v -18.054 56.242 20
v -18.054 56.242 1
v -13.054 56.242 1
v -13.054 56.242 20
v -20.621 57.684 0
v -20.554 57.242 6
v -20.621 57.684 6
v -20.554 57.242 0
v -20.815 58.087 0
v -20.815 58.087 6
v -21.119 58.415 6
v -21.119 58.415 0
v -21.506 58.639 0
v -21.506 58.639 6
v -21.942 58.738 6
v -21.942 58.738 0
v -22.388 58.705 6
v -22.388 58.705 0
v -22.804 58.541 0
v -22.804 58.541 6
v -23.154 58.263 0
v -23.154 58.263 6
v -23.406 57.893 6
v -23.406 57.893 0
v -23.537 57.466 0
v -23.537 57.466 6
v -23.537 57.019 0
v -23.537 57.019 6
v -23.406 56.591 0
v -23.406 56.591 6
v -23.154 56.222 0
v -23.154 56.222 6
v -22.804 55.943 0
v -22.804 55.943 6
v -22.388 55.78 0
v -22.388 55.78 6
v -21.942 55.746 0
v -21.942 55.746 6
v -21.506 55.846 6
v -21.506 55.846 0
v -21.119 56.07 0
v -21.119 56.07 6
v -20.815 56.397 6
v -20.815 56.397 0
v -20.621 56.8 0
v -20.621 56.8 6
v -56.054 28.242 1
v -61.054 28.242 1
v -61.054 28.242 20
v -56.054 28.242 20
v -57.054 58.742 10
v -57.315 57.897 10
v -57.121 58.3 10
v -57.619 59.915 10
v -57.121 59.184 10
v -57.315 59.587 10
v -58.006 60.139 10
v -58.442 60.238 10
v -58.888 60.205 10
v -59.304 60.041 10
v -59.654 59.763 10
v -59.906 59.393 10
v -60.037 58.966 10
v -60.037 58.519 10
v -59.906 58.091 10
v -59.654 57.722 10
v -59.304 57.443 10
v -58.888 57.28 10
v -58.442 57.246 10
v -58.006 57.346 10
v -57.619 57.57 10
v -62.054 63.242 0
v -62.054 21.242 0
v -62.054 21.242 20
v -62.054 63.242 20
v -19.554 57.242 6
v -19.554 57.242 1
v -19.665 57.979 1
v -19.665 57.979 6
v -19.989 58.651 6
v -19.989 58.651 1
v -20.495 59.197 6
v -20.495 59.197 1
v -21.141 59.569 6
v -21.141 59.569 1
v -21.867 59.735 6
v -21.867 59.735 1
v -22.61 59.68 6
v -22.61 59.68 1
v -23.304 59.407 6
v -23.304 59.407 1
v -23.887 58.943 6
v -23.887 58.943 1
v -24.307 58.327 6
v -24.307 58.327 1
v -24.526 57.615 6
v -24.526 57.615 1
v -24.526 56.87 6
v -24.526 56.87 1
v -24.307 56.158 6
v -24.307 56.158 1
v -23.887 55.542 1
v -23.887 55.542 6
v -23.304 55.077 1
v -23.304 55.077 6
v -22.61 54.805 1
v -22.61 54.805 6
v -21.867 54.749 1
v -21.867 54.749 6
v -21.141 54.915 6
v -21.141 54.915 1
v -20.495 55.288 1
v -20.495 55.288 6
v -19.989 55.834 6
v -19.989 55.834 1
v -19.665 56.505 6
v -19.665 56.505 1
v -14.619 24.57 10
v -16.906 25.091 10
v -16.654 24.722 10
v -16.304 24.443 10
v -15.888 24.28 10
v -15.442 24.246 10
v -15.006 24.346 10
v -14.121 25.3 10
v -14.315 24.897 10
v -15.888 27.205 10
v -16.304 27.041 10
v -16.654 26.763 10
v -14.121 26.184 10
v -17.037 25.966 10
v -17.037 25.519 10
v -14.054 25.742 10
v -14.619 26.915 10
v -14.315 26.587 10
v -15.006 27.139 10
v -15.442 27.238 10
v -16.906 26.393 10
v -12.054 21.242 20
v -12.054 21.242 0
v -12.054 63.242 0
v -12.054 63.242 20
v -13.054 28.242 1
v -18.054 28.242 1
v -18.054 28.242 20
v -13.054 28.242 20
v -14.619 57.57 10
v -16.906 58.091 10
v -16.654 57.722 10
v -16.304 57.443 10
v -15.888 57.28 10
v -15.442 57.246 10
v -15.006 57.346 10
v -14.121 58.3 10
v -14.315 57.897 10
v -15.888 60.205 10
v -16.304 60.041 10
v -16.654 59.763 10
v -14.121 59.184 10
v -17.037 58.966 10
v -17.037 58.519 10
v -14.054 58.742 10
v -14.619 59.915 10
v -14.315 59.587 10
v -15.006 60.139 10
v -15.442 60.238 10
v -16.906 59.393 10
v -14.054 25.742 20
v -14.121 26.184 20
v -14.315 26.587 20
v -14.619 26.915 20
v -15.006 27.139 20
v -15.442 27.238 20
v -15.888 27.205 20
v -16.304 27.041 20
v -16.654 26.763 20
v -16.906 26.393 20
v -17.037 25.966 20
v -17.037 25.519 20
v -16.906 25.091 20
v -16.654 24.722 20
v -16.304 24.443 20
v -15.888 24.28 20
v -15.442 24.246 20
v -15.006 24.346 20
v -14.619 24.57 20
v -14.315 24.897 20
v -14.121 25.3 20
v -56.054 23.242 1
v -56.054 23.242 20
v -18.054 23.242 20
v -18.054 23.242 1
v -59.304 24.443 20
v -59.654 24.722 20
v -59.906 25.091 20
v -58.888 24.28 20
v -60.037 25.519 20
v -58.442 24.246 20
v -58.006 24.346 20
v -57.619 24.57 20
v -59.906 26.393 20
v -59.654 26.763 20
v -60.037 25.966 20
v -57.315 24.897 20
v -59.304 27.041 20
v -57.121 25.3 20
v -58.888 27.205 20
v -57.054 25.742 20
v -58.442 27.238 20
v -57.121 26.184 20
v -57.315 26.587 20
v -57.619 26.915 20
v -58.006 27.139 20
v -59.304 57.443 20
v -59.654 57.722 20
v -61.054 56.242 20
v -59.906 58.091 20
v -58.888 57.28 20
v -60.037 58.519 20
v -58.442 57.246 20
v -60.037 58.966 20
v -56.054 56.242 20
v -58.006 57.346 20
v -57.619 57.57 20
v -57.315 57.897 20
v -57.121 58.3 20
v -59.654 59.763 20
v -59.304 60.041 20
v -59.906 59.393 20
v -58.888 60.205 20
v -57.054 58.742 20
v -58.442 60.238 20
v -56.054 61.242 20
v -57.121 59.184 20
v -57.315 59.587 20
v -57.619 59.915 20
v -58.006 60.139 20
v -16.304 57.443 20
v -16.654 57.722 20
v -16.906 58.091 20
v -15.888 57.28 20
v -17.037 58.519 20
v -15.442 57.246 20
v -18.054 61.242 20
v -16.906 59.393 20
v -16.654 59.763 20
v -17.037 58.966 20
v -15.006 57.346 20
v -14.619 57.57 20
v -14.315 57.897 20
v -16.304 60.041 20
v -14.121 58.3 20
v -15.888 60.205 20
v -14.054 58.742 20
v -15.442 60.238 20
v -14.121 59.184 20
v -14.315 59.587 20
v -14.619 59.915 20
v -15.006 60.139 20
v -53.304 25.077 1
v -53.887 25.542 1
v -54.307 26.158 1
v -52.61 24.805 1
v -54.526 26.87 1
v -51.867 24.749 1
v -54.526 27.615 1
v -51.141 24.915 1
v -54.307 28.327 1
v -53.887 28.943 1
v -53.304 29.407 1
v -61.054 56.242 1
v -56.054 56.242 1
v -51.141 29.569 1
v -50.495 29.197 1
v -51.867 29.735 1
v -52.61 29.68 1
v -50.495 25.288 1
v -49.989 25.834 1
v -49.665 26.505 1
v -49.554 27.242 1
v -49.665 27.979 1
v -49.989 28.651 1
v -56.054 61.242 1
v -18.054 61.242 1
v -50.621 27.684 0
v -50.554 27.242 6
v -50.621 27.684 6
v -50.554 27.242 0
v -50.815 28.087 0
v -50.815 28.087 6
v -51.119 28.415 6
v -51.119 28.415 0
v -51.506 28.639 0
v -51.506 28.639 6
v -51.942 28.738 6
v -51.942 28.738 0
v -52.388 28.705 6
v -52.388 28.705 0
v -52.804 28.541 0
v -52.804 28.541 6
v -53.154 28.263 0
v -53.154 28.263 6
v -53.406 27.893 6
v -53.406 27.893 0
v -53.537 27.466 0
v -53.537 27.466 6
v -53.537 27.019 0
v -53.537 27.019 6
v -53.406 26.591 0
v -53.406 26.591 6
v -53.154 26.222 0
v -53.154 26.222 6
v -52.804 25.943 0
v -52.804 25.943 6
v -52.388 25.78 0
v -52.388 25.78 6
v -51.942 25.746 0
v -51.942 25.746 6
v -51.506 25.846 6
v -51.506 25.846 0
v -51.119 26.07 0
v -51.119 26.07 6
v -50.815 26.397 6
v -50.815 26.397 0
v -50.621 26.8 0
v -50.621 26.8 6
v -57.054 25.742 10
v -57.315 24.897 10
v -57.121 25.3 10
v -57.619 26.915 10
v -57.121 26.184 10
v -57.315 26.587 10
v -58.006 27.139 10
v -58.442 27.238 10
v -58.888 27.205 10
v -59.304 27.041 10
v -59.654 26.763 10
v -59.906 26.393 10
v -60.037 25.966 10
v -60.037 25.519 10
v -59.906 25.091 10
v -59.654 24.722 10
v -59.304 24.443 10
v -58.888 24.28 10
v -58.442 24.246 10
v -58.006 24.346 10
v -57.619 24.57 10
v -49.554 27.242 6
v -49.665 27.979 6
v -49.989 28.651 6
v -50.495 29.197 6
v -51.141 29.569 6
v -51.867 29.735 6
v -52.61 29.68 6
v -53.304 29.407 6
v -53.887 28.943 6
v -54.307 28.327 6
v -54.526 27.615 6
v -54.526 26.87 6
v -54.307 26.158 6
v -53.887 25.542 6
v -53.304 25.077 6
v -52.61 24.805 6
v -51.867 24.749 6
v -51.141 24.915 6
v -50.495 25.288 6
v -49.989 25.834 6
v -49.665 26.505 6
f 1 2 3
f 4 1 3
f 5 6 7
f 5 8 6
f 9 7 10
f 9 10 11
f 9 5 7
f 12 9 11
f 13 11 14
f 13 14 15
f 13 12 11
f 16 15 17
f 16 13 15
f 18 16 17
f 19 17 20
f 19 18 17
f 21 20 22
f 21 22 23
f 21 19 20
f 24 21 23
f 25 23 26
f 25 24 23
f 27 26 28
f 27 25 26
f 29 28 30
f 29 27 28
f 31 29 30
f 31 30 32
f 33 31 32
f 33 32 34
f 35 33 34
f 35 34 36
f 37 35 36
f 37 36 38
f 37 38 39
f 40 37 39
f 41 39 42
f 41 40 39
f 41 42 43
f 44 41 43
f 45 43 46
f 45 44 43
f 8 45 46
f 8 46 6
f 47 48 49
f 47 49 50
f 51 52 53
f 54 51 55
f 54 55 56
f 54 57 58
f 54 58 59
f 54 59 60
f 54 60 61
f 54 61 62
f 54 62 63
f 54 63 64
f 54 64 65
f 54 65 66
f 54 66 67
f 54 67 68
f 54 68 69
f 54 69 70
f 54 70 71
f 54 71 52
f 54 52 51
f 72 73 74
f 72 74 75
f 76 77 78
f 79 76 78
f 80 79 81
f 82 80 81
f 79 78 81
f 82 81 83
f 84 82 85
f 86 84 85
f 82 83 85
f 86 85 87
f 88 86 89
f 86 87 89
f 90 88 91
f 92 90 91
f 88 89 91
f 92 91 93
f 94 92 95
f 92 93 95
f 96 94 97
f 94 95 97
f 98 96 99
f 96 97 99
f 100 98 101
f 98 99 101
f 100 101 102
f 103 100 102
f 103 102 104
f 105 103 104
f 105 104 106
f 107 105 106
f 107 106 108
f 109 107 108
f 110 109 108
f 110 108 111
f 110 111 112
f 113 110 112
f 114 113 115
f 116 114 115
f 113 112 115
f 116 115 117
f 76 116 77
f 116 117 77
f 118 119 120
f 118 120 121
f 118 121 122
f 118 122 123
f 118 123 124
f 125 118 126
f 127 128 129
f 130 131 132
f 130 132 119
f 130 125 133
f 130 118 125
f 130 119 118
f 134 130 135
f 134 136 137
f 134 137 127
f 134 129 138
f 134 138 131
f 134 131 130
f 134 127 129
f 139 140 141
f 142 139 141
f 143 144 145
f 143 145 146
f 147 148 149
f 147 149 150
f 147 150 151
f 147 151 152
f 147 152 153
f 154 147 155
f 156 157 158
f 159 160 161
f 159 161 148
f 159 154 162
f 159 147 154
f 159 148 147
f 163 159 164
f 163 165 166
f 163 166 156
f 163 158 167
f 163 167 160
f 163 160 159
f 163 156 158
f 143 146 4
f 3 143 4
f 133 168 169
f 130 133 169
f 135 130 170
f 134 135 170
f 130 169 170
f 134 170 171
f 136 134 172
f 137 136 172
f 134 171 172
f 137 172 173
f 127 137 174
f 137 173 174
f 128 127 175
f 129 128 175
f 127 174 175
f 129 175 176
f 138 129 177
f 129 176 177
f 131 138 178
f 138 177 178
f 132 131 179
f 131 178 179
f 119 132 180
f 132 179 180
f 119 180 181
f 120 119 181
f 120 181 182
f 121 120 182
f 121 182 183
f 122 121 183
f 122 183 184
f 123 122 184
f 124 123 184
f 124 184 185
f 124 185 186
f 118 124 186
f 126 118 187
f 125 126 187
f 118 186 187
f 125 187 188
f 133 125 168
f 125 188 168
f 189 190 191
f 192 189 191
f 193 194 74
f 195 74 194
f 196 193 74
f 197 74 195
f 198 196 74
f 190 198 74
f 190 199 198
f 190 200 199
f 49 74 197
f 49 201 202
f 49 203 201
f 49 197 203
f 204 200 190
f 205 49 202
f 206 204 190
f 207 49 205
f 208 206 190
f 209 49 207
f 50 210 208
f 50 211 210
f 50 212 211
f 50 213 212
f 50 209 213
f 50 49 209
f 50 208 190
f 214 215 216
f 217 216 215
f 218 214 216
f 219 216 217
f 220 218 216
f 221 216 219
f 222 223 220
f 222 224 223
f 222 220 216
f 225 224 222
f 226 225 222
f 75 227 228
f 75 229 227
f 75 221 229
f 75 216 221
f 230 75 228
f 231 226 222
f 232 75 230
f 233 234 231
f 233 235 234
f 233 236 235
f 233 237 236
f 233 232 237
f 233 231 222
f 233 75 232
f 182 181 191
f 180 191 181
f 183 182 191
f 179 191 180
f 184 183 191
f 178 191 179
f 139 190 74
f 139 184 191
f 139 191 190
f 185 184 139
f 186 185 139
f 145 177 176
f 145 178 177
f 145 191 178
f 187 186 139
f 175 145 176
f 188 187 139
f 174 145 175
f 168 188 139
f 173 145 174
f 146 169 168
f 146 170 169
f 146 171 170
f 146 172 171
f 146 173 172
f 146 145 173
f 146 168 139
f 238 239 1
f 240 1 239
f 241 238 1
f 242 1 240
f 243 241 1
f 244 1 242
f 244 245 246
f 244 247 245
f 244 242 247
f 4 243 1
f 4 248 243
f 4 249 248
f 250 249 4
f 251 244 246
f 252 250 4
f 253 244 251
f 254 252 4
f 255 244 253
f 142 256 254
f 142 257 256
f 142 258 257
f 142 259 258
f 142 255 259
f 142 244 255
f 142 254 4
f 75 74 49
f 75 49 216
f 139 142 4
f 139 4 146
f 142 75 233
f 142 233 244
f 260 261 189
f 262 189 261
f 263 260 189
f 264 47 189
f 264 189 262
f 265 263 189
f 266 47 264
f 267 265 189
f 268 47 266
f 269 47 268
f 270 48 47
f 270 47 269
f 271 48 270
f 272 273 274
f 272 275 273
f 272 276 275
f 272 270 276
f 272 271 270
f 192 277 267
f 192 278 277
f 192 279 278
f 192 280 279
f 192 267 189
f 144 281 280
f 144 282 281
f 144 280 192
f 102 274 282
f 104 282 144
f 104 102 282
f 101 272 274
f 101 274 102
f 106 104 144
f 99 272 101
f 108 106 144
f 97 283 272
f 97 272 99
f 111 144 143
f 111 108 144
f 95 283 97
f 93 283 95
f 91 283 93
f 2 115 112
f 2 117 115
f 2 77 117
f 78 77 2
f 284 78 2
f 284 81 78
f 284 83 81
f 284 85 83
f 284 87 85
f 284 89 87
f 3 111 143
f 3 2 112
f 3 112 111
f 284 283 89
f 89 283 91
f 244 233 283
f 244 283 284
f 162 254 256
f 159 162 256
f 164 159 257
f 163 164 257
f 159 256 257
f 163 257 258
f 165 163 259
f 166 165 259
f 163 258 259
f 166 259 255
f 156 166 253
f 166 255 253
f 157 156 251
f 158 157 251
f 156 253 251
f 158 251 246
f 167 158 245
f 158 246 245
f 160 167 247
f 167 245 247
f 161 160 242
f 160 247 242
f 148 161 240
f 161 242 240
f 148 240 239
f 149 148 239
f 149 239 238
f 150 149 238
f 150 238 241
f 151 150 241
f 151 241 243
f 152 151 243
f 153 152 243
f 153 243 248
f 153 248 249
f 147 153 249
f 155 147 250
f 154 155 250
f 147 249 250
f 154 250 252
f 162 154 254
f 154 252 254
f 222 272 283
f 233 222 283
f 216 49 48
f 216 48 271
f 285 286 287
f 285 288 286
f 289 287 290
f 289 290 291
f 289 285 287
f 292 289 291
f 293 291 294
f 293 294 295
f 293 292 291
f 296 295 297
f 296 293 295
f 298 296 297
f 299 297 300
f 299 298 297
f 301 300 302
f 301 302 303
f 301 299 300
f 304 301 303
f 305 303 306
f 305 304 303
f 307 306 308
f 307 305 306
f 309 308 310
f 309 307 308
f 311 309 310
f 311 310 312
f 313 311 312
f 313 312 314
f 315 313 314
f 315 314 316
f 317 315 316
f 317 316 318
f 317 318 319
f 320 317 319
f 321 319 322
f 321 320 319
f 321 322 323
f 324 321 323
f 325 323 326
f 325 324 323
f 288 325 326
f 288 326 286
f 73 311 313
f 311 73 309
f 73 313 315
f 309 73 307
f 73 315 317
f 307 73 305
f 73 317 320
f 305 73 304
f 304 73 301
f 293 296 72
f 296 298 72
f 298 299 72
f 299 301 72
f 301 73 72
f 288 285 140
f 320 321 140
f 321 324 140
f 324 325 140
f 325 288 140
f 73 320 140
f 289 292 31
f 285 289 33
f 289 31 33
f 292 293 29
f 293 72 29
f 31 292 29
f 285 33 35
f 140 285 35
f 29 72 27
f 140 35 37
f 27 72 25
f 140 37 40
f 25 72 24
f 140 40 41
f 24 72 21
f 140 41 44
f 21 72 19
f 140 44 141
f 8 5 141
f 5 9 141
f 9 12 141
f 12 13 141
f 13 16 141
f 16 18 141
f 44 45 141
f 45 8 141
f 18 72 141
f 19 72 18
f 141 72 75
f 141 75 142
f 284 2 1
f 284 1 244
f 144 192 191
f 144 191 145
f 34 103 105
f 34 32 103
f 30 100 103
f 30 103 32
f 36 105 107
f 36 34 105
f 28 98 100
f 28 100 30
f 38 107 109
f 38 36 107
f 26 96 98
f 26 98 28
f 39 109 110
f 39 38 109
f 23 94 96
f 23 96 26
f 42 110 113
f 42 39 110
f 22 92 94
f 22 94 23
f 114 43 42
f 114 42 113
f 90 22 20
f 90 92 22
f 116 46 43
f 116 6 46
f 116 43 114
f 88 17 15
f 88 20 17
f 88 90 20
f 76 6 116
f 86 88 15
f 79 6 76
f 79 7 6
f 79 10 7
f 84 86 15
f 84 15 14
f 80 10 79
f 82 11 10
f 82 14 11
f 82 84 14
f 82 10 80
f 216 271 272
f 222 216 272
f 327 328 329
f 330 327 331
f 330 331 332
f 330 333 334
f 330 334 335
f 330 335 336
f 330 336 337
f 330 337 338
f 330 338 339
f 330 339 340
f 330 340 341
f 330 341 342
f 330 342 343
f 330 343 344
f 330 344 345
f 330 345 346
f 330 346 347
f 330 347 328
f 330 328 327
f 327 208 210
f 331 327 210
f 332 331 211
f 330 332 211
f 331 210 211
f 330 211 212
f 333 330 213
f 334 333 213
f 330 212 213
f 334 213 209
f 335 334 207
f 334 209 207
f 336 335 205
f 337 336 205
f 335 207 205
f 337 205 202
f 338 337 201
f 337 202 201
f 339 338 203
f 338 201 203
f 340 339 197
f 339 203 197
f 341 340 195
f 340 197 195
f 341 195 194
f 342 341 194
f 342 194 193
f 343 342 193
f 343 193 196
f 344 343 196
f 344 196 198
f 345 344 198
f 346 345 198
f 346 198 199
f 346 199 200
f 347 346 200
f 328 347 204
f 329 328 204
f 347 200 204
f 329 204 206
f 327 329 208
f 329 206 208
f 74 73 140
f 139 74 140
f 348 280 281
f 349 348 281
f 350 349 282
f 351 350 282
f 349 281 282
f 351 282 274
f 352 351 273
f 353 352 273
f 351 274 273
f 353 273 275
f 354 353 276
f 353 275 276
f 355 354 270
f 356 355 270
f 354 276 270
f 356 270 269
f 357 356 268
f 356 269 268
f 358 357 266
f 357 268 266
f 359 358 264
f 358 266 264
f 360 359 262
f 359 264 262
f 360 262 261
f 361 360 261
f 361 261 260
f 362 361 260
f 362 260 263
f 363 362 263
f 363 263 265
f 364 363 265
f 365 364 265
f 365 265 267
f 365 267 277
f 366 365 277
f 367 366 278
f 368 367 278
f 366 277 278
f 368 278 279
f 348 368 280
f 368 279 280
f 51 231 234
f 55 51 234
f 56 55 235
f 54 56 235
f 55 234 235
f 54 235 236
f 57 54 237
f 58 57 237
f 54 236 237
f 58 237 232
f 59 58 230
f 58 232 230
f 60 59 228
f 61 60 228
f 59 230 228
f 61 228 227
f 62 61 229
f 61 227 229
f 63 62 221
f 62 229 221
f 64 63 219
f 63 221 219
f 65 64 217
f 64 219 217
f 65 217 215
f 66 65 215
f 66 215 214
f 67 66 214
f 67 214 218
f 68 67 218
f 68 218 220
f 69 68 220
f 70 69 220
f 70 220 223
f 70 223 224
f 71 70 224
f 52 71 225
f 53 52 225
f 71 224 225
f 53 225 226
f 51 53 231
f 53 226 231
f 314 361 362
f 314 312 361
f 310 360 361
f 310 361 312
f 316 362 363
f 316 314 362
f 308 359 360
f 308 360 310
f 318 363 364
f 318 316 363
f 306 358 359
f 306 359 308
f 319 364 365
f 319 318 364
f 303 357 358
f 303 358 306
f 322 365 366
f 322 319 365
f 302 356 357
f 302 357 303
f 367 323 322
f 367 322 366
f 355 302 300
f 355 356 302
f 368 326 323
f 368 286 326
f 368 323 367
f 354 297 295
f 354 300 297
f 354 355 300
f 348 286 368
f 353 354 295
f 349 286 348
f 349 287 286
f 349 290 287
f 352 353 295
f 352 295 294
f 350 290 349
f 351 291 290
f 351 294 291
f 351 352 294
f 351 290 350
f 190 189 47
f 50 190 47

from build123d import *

# Parameters (mm, degrees)
F0_W      = 50
F0_H      = 42
F1_DEPTH  = 20
F2_W      = 38
F2_H      = 38
F3_DEPTH  = 19
F4_W      = 5
F4_H      = 38
F5_DEPTH  = 19
F6_W      = 5
F6_H      = 5
F7_DEPTH  = 19
F8_R      = 1.5
F9_DEPTH  = 10
F10_R     = 2.5
F10_R_2   = 1.5
F11_DEPTH = 5
F12_DEPTH = 1


with BuildPart() as f1:
    # F0 (on Top) → F1 (new body)
    with BuildSketch(Plane.XY):
        with Locations((-37.0541260391, 42.2422697991)):
            Rectangle(F0_W, F0_H)
    extrude(amount=F1_DEPTH)

    # F2 (on face) → F3 (cut)
    with BuildSketch(Plane.XY.offset(20)):
        with Locations((-37.0541260391, 42.2422697991)):
            Rectangle(F2_W, F2_H)
    extrude(amount=-F3_DEPTH, mode=Mode.SUBTRACT)

    # F4 (on face) → F5 (cut)
    with BuildSketch(Plane.XY.offset(20)):
        with Locations((-15.5541260391, 42.2422697991)):
            Rectangle(F4_W, F4_H)
        with Locations((-58.5541260391, 42.2422697991)):
            Rectangle(F4_W, F4_H)
    extrude(amount=-F5_DEPTH, mode=Mode.SUBTRACT)

    # F6 (on face) → F7 (join)
    with BuildSketch(Plane.XY.offset(1)):
        with Locations((-15.5541260391, 58.7422697991)):
            Rectangle(F6_W, F6_H)
        with Locations((-15.5541260391, 25.7422697991)):
            Rectangle(F6_W, F6_H)
        with Locations((-58.5541260391, 58.7422697991)):
            Rectangle(F6_W, F6_H)
        with Locations((-58.5541260391, 25.7422697991)):
            Rectangle(F6_W, F6_H)
    extrude(amount=F7_DEPTH)

    # F8 (on face) → F9 (cut)
    with BuildSketch(Plane.XY.offset(20)):
        with Locations((-15.5541260391, 58.7422697991)):
            Circle(F8_R)
        with Locations((-15.5541260391, 25.7422697991)):
            Circle(F8_R)
        with Locations((-58.5541260391, 25.7422697991)):
            Circle(F8_R)
        with Locations((-58.5541260391, 58.7422697991)):
            Circle(F8_R)
    extrude(amount=-F9_DEPTH, mode=Mode.SUBTRACT)

    # F10 (on face) → F11 (join)
    with BuildSketch(Plane.XY.offset(1)):
        with Locations((-22.0541260391, 57.2422697991)):
            Circle(F10_R)
        with Locations((-22.0541260391, 57.2422697991)):
            Circle(F10_R_2, mode=Mode.SUBTRACT)
        with Locations((-52.0541260391, 27.2422697991)):
            Circle(F10_R)
        with Locations((-52.0541260391, 27.2422697991)):
            Circle(F10_R_2, mode=Mode.SUBTRACT)
    extrude(amount=F11_DEPTH)

    # F12 (cut): faces of the model
    f12_faces = [f1.faces().sort_by_distance(p)[0] for p in [
        (-22.0541260391, 57.2422697991, 1),
        (-52.0541260391, 27.2422697991, 1),
    ]]
    extrude(f12_faces, amount=-F12_DEPTH, mode=Mode.SUBTRACT)


solid = f1.part
